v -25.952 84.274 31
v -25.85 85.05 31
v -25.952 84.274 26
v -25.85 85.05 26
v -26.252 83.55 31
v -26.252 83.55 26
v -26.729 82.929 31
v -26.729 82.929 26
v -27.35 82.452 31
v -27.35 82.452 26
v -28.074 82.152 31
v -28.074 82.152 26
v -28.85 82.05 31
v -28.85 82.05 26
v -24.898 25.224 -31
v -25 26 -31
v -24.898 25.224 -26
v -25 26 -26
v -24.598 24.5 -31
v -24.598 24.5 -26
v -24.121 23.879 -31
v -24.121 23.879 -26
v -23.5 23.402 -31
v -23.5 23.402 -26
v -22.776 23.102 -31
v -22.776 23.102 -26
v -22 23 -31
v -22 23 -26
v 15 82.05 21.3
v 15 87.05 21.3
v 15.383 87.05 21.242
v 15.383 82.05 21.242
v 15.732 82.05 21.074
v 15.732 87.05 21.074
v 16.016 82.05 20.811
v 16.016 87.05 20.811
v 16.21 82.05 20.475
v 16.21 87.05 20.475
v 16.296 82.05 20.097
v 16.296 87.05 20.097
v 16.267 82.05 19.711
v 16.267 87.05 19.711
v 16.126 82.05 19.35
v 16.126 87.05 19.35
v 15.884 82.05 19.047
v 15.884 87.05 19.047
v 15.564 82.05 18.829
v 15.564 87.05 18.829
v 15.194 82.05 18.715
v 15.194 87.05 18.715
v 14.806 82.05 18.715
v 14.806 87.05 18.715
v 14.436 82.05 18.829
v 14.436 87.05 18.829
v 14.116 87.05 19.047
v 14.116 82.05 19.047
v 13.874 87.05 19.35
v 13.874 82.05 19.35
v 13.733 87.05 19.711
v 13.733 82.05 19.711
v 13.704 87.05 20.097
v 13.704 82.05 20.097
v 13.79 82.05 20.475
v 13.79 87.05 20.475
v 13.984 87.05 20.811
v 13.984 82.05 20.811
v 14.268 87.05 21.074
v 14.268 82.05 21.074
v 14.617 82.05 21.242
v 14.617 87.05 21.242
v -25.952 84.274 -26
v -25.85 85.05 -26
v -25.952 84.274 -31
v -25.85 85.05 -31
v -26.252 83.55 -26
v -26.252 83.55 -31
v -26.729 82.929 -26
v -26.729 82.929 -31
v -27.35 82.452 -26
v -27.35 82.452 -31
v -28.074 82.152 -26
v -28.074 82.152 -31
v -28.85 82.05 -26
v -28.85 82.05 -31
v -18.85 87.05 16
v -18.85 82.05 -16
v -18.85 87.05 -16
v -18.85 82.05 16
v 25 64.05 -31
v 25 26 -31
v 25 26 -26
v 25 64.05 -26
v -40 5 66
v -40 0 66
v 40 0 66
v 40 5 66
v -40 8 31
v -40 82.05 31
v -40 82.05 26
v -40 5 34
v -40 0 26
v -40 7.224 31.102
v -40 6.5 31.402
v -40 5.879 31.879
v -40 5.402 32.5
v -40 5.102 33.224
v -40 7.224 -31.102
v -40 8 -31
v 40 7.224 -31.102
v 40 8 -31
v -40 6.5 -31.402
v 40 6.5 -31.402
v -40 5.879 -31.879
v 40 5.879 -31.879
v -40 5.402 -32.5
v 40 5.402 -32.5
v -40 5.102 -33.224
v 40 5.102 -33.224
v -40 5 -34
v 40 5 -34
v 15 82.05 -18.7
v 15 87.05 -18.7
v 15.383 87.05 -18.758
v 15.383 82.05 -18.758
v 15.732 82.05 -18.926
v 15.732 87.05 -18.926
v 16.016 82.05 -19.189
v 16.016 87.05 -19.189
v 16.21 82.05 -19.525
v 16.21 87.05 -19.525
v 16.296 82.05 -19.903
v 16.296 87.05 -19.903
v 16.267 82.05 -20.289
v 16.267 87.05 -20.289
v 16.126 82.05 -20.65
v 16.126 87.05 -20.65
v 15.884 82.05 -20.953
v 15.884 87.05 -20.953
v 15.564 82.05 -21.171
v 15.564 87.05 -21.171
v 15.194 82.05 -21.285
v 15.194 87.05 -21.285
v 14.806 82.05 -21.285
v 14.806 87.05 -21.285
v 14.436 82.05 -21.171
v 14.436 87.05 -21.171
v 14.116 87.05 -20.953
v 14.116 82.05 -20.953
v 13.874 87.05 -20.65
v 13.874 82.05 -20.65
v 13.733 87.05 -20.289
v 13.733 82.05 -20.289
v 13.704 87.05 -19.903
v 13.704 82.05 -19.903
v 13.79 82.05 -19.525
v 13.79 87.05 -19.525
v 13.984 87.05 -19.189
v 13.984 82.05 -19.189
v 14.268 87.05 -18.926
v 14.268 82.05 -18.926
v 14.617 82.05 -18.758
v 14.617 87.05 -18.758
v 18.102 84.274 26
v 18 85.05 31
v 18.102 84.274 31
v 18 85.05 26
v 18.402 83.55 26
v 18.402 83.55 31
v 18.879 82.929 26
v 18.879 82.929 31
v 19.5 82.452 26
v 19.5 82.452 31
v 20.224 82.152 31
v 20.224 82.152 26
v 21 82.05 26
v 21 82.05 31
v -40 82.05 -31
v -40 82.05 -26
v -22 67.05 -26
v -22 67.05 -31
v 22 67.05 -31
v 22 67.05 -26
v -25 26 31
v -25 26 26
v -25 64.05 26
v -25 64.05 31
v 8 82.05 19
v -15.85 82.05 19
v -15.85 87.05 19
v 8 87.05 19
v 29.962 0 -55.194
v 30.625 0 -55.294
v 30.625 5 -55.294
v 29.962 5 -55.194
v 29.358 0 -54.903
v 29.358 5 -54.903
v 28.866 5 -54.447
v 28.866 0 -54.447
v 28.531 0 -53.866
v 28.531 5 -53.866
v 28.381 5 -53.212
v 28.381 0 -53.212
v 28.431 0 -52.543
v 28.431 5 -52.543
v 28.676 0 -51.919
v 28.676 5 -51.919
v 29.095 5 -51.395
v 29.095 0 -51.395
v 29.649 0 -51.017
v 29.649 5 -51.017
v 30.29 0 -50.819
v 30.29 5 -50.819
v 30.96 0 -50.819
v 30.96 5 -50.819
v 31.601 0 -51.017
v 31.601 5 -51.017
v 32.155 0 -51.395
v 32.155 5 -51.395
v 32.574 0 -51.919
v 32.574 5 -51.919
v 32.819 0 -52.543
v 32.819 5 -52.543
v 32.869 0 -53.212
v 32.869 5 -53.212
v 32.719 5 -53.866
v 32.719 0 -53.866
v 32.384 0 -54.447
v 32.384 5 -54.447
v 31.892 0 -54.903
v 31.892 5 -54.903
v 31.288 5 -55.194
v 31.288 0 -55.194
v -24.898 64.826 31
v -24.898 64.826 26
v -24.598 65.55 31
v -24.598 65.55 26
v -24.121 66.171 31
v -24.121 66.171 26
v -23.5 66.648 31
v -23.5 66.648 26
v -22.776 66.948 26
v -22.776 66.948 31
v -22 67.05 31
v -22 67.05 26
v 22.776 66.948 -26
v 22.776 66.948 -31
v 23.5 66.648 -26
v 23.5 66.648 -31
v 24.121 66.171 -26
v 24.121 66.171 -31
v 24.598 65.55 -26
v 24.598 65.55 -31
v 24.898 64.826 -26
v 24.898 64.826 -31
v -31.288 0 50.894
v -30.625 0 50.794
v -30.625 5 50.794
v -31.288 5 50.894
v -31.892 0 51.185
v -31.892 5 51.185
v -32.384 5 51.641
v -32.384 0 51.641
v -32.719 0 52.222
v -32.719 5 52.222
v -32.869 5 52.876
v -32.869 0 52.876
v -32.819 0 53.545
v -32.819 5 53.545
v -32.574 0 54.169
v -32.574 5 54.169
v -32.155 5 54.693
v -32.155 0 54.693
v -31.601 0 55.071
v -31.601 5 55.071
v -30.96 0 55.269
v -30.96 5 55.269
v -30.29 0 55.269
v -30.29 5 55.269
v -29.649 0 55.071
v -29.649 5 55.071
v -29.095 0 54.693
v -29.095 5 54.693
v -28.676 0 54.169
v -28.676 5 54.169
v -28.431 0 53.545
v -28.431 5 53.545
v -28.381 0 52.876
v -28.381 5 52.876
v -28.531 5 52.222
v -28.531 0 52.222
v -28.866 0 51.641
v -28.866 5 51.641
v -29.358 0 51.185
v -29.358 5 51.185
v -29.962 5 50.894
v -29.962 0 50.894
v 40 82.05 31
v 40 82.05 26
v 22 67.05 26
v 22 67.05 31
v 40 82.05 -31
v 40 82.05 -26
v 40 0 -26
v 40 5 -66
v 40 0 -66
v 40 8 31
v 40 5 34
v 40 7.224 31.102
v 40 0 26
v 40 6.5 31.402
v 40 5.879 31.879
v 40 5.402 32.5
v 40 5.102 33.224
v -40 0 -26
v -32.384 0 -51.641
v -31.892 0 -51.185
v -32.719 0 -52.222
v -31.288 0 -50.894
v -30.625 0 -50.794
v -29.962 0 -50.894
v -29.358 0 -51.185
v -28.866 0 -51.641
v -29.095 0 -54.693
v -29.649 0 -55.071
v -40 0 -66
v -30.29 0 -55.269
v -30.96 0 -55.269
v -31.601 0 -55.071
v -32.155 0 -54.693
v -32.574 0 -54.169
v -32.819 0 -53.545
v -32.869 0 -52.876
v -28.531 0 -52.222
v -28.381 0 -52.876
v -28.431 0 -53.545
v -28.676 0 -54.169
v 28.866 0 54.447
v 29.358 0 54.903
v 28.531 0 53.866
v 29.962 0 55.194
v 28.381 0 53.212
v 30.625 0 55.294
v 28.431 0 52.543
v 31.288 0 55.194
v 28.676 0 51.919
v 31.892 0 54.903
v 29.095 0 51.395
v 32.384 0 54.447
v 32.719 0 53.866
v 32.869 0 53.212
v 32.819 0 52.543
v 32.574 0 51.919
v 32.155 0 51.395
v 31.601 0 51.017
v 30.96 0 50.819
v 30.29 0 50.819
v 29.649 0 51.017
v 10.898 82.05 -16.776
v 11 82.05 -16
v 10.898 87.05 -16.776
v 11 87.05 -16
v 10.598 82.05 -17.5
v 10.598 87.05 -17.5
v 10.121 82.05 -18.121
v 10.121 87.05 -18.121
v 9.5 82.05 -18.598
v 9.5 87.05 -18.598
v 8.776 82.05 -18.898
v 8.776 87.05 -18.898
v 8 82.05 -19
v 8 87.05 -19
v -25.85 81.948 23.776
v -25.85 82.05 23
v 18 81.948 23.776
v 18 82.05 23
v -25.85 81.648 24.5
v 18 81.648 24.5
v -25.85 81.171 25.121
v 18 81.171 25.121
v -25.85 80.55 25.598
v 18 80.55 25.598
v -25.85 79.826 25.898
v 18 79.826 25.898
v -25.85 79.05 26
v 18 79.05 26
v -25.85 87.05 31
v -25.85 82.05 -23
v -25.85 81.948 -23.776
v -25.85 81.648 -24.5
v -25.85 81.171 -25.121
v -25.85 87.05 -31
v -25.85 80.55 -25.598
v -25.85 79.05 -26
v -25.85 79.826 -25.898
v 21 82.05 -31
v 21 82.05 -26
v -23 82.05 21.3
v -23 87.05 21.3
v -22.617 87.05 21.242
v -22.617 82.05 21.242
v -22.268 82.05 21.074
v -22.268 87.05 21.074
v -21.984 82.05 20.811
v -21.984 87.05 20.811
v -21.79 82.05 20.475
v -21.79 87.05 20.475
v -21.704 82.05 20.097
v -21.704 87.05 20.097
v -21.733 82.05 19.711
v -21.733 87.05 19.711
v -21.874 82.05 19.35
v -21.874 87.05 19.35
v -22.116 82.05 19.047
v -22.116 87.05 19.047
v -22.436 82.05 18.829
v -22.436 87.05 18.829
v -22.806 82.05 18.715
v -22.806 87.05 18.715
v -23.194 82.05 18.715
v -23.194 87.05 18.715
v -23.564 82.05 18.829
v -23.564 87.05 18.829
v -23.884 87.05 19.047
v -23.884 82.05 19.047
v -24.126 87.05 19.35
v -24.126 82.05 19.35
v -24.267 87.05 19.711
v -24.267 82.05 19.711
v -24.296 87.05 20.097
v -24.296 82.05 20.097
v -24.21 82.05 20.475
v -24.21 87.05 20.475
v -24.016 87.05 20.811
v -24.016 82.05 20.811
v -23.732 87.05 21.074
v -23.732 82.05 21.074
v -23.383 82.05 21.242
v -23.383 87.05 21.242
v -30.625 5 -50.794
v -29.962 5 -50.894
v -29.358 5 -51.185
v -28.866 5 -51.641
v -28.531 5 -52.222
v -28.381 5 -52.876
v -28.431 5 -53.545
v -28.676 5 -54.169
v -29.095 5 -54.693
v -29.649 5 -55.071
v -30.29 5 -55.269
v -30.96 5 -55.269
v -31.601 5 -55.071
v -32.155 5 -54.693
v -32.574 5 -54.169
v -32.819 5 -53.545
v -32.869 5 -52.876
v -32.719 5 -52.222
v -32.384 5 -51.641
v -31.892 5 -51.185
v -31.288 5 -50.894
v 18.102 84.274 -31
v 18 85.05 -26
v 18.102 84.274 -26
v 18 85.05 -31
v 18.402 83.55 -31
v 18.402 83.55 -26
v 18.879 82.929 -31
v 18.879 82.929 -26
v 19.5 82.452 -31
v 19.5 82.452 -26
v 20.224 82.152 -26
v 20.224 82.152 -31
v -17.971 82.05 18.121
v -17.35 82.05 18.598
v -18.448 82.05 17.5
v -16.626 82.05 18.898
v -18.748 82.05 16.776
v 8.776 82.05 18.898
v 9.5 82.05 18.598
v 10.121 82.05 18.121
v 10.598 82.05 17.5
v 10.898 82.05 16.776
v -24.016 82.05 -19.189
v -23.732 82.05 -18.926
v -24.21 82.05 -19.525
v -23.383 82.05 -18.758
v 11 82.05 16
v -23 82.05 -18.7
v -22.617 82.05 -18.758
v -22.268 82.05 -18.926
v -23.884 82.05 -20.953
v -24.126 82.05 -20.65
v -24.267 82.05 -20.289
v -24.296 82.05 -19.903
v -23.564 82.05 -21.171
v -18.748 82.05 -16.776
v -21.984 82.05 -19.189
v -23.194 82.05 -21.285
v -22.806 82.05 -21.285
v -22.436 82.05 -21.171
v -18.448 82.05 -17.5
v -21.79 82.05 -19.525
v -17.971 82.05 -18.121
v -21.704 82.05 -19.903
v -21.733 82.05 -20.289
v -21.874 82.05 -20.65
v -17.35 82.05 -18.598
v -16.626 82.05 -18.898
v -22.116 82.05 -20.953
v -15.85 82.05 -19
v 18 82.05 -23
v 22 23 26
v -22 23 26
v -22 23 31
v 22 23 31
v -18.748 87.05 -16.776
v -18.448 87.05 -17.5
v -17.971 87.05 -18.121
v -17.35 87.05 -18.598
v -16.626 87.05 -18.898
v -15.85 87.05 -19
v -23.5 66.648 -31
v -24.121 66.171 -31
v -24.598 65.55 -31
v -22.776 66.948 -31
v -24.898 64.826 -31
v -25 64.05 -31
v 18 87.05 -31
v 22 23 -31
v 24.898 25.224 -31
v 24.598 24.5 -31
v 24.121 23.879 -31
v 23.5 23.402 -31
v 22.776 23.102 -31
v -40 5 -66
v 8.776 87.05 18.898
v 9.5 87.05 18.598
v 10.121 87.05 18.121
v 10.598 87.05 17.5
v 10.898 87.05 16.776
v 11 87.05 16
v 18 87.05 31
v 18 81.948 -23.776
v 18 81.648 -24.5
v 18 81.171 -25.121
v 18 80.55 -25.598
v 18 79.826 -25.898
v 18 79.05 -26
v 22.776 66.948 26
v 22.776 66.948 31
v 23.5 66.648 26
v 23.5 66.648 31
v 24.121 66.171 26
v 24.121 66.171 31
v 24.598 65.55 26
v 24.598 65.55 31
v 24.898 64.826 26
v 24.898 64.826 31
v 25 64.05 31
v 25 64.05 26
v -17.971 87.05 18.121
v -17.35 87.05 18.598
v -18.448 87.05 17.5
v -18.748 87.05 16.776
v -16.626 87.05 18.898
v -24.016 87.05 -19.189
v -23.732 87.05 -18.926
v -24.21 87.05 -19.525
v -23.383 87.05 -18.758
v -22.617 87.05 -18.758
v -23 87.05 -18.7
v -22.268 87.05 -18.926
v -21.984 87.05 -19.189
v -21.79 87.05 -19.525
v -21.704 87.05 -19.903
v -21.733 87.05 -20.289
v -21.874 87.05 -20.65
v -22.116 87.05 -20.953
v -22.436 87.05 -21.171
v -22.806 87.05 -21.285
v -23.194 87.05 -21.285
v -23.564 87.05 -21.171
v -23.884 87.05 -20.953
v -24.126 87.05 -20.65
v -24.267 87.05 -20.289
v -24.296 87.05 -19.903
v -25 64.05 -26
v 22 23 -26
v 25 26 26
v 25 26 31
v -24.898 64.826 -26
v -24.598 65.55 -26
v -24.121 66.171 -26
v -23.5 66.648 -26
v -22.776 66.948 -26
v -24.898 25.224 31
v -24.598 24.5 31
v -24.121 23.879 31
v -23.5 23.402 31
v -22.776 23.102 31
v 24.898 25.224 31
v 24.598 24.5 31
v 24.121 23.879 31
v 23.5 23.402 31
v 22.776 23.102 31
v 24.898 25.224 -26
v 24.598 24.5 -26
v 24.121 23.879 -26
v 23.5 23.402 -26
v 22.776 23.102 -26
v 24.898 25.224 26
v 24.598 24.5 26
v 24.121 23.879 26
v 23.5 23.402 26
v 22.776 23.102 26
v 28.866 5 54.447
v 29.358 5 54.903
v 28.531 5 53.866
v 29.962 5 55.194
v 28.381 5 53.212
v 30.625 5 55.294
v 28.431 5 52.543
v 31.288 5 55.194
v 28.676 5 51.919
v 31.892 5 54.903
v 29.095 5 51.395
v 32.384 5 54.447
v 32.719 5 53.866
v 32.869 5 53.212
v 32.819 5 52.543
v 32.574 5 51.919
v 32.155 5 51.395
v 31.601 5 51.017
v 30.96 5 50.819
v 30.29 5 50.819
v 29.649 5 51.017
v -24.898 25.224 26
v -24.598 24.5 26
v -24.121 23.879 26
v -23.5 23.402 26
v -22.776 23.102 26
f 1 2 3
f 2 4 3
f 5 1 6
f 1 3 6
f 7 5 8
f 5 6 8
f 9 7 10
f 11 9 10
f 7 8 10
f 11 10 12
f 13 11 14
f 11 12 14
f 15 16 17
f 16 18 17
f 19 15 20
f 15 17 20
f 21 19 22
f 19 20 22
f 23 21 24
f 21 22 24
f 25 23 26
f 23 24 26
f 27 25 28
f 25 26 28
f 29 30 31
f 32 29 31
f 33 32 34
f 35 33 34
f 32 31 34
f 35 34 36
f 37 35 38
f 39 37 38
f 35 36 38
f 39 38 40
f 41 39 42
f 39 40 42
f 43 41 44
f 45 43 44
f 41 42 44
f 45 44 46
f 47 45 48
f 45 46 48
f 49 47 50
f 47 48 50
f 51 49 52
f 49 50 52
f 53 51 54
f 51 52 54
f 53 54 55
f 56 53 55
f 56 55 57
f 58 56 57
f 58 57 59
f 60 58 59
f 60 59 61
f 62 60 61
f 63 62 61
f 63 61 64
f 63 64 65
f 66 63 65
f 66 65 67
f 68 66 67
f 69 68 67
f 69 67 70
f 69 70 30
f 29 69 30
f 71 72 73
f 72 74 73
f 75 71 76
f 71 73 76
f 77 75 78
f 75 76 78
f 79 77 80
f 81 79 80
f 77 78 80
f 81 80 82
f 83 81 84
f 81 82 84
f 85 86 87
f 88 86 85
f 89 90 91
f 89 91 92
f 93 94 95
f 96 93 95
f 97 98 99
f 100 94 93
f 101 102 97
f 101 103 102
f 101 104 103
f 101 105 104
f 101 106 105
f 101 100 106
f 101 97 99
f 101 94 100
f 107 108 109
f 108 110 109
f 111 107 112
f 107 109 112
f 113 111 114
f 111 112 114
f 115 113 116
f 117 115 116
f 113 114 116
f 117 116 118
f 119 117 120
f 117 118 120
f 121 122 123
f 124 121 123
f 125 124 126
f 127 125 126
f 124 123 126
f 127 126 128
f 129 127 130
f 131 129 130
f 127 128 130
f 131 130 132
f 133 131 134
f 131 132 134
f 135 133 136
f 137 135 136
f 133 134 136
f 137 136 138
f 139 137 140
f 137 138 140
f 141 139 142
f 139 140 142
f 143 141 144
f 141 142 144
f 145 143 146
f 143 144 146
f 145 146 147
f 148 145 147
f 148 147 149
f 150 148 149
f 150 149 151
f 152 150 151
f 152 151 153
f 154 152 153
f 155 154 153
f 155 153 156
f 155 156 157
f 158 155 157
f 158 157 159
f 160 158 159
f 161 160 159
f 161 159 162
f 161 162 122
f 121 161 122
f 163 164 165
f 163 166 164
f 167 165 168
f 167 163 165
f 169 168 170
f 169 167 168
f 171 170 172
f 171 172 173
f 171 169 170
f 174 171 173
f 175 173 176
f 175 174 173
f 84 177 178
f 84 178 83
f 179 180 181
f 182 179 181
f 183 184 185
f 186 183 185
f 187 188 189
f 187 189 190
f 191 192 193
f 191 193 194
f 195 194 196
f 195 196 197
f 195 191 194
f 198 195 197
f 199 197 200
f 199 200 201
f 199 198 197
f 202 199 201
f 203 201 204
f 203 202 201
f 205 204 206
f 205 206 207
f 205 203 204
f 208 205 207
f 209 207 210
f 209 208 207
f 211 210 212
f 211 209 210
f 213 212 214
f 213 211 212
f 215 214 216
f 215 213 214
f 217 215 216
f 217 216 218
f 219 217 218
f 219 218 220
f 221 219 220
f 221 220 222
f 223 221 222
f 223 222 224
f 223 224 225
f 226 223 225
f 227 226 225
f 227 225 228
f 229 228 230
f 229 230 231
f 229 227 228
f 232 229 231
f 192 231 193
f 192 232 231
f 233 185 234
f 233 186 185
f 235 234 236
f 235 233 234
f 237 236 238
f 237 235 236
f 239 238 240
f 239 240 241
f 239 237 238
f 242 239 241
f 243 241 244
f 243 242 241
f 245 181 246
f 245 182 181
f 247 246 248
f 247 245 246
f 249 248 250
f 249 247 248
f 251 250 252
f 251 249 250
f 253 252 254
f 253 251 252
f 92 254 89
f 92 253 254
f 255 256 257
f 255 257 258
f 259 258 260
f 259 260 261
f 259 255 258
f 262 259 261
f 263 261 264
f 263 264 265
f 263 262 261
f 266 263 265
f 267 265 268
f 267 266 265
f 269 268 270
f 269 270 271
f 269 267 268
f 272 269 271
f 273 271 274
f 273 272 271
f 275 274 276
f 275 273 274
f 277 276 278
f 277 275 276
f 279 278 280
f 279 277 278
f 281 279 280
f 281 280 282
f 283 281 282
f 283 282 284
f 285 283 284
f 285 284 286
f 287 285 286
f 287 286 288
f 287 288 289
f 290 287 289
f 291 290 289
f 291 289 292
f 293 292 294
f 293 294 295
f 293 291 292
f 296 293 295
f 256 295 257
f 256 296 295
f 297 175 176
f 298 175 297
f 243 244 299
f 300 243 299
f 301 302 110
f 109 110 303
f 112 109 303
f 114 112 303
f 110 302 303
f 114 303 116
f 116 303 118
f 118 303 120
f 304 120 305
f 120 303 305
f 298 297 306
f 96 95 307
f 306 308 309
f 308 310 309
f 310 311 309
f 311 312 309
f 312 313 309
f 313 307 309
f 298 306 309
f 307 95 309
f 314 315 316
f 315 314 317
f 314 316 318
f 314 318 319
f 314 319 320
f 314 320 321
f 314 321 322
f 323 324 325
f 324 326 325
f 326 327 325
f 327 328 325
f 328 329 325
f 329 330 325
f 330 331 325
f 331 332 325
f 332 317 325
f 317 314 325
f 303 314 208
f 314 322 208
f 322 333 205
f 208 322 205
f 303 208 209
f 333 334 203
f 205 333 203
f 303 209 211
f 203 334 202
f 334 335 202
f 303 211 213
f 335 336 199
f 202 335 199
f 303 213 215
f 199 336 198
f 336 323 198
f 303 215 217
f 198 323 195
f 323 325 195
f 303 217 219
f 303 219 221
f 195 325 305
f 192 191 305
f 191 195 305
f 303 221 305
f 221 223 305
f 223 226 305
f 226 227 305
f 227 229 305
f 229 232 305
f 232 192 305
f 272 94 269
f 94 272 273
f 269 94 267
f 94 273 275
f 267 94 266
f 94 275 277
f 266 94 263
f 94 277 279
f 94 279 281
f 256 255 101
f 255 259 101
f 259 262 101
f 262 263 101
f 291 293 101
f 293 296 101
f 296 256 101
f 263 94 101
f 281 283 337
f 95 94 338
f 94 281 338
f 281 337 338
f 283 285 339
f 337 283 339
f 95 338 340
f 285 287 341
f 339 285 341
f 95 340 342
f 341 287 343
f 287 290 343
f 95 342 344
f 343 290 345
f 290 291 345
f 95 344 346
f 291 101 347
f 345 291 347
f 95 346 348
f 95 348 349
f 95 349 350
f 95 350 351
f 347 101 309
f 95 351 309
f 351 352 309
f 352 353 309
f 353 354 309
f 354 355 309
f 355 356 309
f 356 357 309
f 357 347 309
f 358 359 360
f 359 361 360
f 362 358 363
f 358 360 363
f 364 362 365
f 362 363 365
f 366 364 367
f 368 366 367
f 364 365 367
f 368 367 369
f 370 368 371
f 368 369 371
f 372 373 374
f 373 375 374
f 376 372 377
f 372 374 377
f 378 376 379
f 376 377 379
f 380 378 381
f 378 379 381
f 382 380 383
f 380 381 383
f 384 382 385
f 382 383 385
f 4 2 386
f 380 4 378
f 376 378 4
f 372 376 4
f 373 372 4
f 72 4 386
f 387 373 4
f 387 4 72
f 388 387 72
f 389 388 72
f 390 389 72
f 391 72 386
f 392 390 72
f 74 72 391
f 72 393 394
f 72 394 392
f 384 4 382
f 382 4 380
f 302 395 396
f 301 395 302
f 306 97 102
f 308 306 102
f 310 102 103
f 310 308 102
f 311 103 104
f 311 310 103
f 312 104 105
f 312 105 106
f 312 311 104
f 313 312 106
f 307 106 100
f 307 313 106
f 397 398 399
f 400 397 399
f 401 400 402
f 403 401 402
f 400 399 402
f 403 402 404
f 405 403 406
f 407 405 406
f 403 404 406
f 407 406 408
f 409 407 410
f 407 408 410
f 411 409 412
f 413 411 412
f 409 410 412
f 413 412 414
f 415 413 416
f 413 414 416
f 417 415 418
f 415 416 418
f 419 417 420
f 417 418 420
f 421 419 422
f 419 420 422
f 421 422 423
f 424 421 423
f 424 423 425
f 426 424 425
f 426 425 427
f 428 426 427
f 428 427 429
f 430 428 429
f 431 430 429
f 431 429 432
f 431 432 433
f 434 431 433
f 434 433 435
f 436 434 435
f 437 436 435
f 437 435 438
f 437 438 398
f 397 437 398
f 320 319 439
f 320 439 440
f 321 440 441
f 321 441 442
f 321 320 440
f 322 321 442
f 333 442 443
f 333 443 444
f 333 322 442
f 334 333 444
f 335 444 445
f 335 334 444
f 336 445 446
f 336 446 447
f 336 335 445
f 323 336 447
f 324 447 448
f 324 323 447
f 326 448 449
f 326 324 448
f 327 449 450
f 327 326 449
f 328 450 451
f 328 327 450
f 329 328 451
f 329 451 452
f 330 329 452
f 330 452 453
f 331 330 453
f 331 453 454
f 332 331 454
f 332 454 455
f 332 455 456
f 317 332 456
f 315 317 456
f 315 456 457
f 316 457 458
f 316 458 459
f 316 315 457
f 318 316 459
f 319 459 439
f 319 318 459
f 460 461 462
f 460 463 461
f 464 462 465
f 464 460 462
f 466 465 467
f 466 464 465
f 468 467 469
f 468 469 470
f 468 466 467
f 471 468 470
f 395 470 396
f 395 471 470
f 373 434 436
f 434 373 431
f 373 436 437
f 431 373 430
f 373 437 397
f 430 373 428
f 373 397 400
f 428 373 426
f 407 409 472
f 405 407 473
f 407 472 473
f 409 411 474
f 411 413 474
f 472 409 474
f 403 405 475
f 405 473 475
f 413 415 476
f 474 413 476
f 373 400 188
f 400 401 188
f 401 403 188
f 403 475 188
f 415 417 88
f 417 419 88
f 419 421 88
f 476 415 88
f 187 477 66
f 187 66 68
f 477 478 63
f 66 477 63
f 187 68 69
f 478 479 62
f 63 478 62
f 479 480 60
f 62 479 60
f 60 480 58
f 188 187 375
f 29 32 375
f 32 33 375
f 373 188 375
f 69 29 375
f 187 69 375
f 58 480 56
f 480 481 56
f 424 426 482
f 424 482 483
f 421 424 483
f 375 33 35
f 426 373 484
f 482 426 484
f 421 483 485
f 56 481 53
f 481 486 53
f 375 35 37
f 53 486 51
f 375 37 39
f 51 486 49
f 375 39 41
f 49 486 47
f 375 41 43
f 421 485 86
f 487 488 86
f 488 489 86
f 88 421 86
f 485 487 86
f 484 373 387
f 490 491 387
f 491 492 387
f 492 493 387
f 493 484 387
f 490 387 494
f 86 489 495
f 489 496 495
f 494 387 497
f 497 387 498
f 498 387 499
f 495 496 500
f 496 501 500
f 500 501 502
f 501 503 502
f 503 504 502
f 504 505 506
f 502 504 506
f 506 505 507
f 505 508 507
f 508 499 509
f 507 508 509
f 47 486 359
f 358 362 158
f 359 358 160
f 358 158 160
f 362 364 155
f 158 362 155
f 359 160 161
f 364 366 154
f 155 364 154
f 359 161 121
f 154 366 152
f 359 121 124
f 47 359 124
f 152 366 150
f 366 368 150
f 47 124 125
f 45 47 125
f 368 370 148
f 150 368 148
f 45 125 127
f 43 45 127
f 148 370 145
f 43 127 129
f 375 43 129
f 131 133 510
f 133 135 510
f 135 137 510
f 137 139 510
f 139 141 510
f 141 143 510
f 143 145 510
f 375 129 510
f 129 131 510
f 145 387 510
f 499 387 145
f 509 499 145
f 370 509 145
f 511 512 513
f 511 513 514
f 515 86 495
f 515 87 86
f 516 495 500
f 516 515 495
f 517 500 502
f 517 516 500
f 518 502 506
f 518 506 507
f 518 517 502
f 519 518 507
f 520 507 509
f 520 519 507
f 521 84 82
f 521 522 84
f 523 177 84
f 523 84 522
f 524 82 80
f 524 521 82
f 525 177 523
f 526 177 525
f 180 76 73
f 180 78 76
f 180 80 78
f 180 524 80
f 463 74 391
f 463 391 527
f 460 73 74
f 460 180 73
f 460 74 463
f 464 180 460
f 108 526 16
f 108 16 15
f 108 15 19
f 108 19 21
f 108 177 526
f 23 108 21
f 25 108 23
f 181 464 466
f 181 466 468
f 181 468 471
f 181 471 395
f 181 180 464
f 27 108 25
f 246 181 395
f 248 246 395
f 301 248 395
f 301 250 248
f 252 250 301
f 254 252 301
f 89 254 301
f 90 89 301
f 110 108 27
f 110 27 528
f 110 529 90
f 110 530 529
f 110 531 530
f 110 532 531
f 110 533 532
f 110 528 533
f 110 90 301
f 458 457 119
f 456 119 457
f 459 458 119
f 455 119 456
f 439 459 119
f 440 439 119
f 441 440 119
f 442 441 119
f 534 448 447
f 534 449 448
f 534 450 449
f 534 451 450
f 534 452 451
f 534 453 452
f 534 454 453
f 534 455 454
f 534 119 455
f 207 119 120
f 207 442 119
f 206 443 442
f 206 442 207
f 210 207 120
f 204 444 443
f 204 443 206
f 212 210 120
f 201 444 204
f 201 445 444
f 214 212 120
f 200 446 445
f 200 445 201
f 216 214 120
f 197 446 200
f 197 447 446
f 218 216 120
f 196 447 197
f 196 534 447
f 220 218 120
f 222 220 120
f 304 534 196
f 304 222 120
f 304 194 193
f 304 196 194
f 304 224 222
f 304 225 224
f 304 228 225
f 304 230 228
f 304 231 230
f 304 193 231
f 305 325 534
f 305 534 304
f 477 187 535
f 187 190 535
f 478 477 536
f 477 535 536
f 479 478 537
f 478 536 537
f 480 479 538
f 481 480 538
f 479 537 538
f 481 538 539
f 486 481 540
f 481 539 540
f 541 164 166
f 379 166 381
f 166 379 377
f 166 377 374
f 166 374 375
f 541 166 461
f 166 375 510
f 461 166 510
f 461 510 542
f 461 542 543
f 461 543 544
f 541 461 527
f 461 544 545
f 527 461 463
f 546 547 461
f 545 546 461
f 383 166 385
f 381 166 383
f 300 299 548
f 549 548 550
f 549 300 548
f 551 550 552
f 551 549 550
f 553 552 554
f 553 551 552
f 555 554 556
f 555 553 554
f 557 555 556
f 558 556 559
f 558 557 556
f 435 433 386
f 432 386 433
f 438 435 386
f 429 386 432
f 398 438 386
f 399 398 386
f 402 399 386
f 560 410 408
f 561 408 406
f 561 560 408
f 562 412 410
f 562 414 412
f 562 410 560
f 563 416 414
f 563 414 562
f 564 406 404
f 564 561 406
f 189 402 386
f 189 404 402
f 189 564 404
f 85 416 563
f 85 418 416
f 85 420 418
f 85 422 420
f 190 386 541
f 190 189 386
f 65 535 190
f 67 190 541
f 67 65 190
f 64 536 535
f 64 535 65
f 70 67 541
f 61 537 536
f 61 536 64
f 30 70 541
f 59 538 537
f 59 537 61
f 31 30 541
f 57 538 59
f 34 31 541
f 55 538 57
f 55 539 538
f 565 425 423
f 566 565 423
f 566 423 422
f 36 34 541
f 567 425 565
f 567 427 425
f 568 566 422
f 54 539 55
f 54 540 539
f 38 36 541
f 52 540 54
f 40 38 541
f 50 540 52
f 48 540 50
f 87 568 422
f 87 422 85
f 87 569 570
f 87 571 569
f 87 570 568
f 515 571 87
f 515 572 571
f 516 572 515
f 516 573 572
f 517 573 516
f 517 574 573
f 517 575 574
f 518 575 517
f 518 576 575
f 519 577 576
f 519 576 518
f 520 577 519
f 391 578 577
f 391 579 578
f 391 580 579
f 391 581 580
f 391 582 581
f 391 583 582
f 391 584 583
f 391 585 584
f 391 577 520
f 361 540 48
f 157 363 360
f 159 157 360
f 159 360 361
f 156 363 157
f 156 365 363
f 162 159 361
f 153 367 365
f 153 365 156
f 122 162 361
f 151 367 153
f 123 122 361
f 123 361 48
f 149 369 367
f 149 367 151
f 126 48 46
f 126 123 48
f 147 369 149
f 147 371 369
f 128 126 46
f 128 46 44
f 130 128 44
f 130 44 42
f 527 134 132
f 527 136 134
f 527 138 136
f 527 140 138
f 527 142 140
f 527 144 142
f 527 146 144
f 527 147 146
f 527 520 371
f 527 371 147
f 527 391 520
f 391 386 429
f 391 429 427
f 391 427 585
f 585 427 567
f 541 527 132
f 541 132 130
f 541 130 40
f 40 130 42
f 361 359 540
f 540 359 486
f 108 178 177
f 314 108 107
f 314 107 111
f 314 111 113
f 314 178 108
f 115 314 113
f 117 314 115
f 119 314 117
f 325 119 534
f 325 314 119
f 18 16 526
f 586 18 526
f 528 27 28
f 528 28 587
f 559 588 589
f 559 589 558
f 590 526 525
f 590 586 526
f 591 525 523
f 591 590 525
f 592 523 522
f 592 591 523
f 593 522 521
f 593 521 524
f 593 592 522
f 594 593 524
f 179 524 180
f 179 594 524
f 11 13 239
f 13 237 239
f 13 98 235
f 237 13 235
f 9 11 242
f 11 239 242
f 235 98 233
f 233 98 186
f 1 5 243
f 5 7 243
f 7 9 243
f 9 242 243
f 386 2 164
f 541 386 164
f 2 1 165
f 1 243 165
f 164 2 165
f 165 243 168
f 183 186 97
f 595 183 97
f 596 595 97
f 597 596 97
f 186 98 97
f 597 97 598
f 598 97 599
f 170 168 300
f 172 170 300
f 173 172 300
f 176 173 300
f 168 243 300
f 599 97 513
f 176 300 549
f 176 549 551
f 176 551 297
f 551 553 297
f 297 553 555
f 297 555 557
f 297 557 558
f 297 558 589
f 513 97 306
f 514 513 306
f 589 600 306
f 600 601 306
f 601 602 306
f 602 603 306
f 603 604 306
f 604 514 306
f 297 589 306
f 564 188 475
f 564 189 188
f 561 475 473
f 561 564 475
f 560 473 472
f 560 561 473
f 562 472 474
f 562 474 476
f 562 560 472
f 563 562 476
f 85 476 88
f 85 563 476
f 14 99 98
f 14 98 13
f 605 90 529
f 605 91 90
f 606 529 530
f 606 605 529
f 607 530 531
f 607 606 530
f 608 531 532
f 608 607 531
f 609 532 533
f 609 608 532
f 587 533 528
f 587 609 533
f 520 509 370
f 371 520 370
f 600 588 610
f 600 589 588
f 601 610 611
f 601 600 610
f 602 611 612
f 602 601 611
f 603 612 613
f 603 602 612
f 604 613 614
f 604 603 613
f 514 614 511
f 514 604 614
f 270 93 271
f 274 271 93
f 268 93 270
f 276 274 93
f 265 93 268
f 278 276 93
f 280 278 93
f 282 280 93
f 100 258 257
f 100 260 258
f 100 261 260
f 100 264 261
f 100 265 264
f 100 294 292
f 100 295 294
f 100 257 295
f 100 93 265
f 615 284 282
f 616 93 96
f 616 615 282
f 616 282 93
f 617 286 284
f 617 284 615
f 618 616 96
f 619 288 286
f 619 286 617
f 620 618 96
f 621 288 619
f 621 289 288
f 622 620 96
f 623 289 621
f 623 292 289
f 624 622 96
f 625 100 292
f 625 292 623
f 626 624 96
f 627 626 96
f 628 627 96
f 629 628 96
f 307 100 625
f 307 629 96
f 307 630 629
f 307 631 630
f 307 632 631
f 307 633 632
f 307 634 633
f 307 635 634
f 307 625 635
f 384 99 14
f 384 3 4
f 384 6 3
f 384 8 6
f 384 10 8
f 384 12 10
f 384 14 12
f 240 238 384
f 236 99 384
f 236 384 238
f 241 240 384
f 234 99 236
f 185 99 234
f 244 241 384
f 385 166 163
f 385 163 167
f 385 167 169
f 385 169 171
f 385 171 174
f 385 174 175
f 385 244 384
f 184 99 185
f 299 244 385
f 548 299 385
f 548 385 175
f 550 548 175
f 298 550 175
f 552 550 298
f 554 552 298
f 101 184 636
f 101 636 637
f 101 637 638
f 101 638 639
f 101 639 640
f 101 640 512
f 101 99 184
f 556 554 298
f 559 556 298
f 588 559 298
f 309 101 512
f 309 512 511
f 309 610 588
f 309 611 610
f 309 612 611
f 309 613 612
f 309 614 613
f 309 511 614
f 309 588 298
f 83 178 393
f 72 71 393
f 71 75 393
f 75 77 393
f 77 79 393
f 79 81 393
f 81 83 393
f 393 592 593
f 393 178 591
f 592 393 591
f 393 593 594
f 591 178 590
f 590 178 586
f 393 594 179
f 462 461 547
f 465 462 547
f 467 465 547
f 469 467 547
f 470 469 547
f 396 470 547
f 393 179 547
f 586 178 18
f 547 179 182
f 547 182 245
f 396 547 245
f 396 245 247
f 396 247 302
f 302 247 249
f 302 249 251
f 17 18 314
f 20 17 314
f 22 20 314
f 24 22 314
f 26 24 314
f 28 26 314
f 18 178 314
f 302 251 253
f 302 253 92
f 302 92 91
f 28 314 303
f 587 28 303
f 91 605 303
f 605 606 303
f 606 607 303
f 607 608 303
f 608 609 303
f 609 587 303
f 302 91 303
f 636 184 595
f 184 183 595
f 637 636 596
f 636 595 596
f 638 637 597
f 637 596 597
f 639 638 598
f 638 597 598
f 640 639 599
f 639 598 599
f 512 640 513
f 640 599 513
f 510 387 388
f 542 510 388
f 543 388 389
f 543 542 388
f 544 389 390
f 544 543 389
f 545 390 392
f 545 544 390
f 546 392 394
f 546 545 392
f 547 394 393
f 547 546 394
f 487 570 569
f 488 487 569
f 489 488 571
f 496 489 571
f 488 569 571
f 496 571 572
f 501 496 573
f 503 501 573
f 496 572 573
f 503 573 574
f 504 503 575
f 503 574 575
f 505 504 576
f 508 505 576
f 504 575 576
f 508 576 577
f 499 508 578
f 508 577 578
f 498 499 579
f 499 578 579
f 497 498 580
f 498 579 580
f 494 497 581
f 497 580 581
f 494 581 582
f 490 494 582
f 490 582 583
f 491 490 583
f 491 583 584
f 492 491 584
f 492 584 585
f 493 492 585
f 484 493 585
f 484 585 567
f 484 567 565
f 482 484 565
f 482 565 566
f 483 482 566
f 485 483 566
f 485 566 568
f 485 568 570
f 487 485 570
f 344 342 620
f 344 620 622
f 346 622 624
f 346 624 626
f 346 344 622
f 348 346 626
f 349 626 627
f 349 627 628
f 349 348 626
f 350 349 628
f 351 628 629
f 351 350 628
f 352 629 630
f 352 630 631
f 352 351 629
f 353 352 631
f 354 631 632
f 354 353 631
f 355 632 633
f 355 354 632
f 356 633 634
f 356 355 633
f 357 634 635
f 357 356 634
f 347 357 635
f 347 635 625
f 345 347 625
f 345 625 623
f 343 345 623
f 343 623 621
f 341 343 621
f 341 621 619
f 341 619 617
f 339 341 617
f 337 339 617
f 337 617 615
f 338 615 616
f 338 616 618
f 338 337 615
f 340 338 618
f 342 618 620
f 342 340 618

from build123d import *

# Parameters (mm, degrees)
SKETCH1_W               = 80
SKETCH1_H               = 40
SKETCH1_R               = 2.25
BOSS_EXTRUDE1_DEPTH     = 5
BOSS_EXTRUDE1_2_DEPTH   = 5
SKETCH2_W               = 80
SKETCH2_H               = 5
BOSS_EXTRUDE2_DEPTH     = 77.05
SKETCH3_W               = 43.85
SKETCH3_H               = 62
BOSS_EXTRUDE3_DEPTH     = 5
SKETCH5_W               = 29.85
SKETCH5_H               = 38
CUT_EXTRUDE2_DEPTH      = 10
CUT_EXTRUDE1_REACH      = 118.334
SKETCH4_R               = 1.3
FILLET1_R               = 3
FILLET2_R               = 3
CUT_EXTRUDE3_DEPTH      = 137.333057253
CUT_EXTRUDE3_DEPTH_BACK = 137.333057253
SKETCH6_W               = 50
SKETCH6_H               = 44.05
FILLET3_R               = 3


with BuildPart() as part:
    # Sketch1 → Boss-Extrude1 (new body)
    with BuildSketch(Plane(origin=(0, 0, 0), x_dir=(1, 0, 0), z_dir=(0, 1, 0))):
        with Locations((0, 46)):
            Rectangle(SKETCH1_W, SKETCH1_H)
        with Locations(Location((-30.625, 53.044055982, 0), (0, 0, 270))):
            Circle(SKETCH1_R, mode=Mode.SUBTRACT)
        with Locations(Location((30.625, 53.044055982, 0), (0, 0, 90))):
            Circle(SKETCH1_R, mode=Mode.SUBTRACT)
    extrude(amount=BOSS_EXTRUDE1_DEPTH)



with BuildPart() as body_2:
    # Sketch1 → Boss-Extrude1 2 (new body)
    with BuildSketch(Plane(origin=(0, 0, 0), x_dir=(1, 0, 0), z_dir=(0, 1, 0))):
        with Locations((0, -46)):
            Rectangle(SKETCH1_W, SKETCH1_H)
        with Locations(Location((30.625, -53.044055982, 0), (0, 0, 270))):
            Circle(SKETCH1_R, mode=Mode.SUBTRACT)
        with Locations(Location((-30.625, -53.044055982, 0), (0, 0, 90))):
            Circle(SKETCH1_R, mode=Mode.SUBTRACT)
    extrude(amount=BOSS_EXTRUDE1_2_DEPTH)


with BuildPart() as part_1:
    add(part.part)

    add(body_2.part)  # Boss-Extrude2 merges body 2
    # Sketch2 → Boss-Extrude2 (add)
    with BuildSketch(Plane(origin=(0, 5, 0), x_dir=(1, 0, 0), z_dir=(0, 1, 0))):
        with Locations((0, 28.5)):
            Rectangle(SKETCH2_W, SKETCH2_H)
        with Locations((0, -28.5)):
            Rectangle(SKETCH2_W, SKETCH2_H)
    extrude(amount=BOSS_EXTRUDE2_DEPTH)

    # Sketch3 → Boss-Extrude3 (add)
    with BuildSketch(Plane(origin=(0, 82.05, 0), x_dir=(1, 0, 0), z_dir=(0, 1, 0))):
        with Locations((-3.925, 0)):
            Rectangle(SKETCH3_W, SKETCH3_H)
    extrude(amount=BOSS_EXTRUDE3_DEPTH)

    # Sketch5 → Cut-Extrude2 (cut)
    with BuildSketch(Plane.XZ.offset(-82.05)):
        with Locations((-3.925, 0)):
            Rectangle(SKETCH5_W, SKETCH5_H)
    extrude(amount=-CUT_EXTRUDE2_DEPTH, mode=Mode.SUBTRACT)

    # Sketch4 → Cut-Extrude1 (cut, up to next)
    with BuildSketch(Plane(origin=(0, 87.05, 0), x_dir=(1, 0, 0), z_dir=(0, 1, 0)), mode=Mode.PRIVATE) as cut_extrude1_sk1:
        with Locations(Location((-23, 20, 0), (0, 0, 270))):
            Circle(SKETCH4_R)
    cut_extrude1_tool1 = extrude(cut_extrude1_sk1.sketch, amount=-CUT_EXTRUDE1_REACH, mode=Mode.PRIVATE) & part_1.part
    # Sketch4 → Cut-Extrude1 (cut, up to next)
    with BuildSketch(Plane(origin=(0, 87.05, 0), x_dir=(1, 0, 0), z_dir=(0, 1, 0)), mode=Mode.PRIVATE) as cut_extrude1_sk2:
        with Locations(Location((15, 20, 0), (0, 0, 270))):
            Circle(SKETCH4_R)
    cut_extrude1_tool2 = extrude(cut_extrude1_sk2.sketch, amount=-CUT_EXTRUDE1_REACH, mode=Mode.PRIVATE) & part_1.part
    # Sketch4 → Cut-Extrude1 (cut, up to next)
    with BuildSketch(Plane(origin=(0, 87.05, 0), x_dir=(1, 0, 0), z_dir=(0, 1, 0)), mode=Mode.PRIVATE) as cut_extrude1_sk3:
        with Locations(Location((15, -20, 0), (0, 0, 270))):
            Circle(SKETCH4_R)
    cut_extrude1_tool3 = extrude(cut_extrude1_sk3.sketch, amount=-CUT_EXTRUDE1_REACH, mode=Mode.PRIVATE) & part_1.part
    # Sketch4 → Cut-Extrude1 (cut, up to next)
    with BuildSketch(Plane(origin=(0, 87.05, 0), x_dir=(1, 0, 0), z_dir=(0, 1, 0)), mode=Mode.PRIVATE) as cut_extrude1_sk4:
        with Locations(Location((-23, -20, 0), (0, 0, 270))):
            Circle(SKETCH4_R)
    cut_extrude1_tool4 = extrude(cut_extrude1_sk4.sketch, amount=-CUT_EXTRUDE1_REACH, mode=Mode.PRIVATE) & part_1.part
    add(cut_extrude1_tool1.solids().sort_by_distance((-23, 87.05, -20))[0], mode=Mode.SUBTRACT)
    add(cut_extrude1_tool2.solids().sort_by_distance((15, 87.05, -20))[0], mode=Mode.SUBTRACT)
    add(cut_extrude1_tool3.solids().sort_by_distance((15, 87.05, 20))[0], mode=Mode.SUBTRACT)
    add(cut_extrude1_tool4.solids().sort_by_distance((-23, 87.05, 20))[0], mode=Mode.SUBTRACT)

    # Fillet1
    fillet1_edges = [part_1.edges().sort_by_distance(p)[0] for p in [
        (0, 5, -31),
        (-3.925, 82.05, -26),
        (-3.925, 82.05, 26),
        (0, 5, 31),
    ]]
    fillet(fillet1_edges, radius=FILLET1_R)

    # Fillet2
    fillet2_edges = [part_1.edges().sort_by_distance(p)[0] for p in [
        (18, 82.05, -28.5),
        (-25.85, 82.05, -28.5),
        (-25.85, 82.05, 28.5),
        (18, 82.05, 28.5),
    ]]
    fillet(fillet2_edges, radius=FILLET2_R)

    # Sketch6 → Cut-Extrude3 (cut, two sides: drawn at the far end of the back side and taken through both)
    with BuildSketch(Plane.XY.offset(31).offset(-CUT_EXTRUDE3_DEPTH_BACK)):
        with Locations((0, 45.025)):
            Rectangle(SKETCH6_W, SKETCH6_H)
    extrude(amount=CUT_EXTRUDE3_DEPTH + CUT_EXTRUDE3_DEPTH_BACK, mode=Mode.SUBTRACT)

    # Fillet3
    fillet3_edges = [part_1.edges().sort_by_distance(p)[0] for p in [
        (-25, 67.05, -28.5),
        (-25, 67.05, 28.5),
        (-25, 23, -28.5),
        (-25, 23, 28.5),
        (25, 23, -28.5),
        (25, 23, 28.5),
        (25, 67.05, -28.5),
        (25, 67.05, 28.5),
        (-18.85, 84.55, -19),
        (-18.85, 84.55, 19),
        (11, 84.55, 19),
        (11, 84.55, -19),
    ]]
    fillet(fillet3_edges, radius=FILLET3_R)


solid = part_1.part
